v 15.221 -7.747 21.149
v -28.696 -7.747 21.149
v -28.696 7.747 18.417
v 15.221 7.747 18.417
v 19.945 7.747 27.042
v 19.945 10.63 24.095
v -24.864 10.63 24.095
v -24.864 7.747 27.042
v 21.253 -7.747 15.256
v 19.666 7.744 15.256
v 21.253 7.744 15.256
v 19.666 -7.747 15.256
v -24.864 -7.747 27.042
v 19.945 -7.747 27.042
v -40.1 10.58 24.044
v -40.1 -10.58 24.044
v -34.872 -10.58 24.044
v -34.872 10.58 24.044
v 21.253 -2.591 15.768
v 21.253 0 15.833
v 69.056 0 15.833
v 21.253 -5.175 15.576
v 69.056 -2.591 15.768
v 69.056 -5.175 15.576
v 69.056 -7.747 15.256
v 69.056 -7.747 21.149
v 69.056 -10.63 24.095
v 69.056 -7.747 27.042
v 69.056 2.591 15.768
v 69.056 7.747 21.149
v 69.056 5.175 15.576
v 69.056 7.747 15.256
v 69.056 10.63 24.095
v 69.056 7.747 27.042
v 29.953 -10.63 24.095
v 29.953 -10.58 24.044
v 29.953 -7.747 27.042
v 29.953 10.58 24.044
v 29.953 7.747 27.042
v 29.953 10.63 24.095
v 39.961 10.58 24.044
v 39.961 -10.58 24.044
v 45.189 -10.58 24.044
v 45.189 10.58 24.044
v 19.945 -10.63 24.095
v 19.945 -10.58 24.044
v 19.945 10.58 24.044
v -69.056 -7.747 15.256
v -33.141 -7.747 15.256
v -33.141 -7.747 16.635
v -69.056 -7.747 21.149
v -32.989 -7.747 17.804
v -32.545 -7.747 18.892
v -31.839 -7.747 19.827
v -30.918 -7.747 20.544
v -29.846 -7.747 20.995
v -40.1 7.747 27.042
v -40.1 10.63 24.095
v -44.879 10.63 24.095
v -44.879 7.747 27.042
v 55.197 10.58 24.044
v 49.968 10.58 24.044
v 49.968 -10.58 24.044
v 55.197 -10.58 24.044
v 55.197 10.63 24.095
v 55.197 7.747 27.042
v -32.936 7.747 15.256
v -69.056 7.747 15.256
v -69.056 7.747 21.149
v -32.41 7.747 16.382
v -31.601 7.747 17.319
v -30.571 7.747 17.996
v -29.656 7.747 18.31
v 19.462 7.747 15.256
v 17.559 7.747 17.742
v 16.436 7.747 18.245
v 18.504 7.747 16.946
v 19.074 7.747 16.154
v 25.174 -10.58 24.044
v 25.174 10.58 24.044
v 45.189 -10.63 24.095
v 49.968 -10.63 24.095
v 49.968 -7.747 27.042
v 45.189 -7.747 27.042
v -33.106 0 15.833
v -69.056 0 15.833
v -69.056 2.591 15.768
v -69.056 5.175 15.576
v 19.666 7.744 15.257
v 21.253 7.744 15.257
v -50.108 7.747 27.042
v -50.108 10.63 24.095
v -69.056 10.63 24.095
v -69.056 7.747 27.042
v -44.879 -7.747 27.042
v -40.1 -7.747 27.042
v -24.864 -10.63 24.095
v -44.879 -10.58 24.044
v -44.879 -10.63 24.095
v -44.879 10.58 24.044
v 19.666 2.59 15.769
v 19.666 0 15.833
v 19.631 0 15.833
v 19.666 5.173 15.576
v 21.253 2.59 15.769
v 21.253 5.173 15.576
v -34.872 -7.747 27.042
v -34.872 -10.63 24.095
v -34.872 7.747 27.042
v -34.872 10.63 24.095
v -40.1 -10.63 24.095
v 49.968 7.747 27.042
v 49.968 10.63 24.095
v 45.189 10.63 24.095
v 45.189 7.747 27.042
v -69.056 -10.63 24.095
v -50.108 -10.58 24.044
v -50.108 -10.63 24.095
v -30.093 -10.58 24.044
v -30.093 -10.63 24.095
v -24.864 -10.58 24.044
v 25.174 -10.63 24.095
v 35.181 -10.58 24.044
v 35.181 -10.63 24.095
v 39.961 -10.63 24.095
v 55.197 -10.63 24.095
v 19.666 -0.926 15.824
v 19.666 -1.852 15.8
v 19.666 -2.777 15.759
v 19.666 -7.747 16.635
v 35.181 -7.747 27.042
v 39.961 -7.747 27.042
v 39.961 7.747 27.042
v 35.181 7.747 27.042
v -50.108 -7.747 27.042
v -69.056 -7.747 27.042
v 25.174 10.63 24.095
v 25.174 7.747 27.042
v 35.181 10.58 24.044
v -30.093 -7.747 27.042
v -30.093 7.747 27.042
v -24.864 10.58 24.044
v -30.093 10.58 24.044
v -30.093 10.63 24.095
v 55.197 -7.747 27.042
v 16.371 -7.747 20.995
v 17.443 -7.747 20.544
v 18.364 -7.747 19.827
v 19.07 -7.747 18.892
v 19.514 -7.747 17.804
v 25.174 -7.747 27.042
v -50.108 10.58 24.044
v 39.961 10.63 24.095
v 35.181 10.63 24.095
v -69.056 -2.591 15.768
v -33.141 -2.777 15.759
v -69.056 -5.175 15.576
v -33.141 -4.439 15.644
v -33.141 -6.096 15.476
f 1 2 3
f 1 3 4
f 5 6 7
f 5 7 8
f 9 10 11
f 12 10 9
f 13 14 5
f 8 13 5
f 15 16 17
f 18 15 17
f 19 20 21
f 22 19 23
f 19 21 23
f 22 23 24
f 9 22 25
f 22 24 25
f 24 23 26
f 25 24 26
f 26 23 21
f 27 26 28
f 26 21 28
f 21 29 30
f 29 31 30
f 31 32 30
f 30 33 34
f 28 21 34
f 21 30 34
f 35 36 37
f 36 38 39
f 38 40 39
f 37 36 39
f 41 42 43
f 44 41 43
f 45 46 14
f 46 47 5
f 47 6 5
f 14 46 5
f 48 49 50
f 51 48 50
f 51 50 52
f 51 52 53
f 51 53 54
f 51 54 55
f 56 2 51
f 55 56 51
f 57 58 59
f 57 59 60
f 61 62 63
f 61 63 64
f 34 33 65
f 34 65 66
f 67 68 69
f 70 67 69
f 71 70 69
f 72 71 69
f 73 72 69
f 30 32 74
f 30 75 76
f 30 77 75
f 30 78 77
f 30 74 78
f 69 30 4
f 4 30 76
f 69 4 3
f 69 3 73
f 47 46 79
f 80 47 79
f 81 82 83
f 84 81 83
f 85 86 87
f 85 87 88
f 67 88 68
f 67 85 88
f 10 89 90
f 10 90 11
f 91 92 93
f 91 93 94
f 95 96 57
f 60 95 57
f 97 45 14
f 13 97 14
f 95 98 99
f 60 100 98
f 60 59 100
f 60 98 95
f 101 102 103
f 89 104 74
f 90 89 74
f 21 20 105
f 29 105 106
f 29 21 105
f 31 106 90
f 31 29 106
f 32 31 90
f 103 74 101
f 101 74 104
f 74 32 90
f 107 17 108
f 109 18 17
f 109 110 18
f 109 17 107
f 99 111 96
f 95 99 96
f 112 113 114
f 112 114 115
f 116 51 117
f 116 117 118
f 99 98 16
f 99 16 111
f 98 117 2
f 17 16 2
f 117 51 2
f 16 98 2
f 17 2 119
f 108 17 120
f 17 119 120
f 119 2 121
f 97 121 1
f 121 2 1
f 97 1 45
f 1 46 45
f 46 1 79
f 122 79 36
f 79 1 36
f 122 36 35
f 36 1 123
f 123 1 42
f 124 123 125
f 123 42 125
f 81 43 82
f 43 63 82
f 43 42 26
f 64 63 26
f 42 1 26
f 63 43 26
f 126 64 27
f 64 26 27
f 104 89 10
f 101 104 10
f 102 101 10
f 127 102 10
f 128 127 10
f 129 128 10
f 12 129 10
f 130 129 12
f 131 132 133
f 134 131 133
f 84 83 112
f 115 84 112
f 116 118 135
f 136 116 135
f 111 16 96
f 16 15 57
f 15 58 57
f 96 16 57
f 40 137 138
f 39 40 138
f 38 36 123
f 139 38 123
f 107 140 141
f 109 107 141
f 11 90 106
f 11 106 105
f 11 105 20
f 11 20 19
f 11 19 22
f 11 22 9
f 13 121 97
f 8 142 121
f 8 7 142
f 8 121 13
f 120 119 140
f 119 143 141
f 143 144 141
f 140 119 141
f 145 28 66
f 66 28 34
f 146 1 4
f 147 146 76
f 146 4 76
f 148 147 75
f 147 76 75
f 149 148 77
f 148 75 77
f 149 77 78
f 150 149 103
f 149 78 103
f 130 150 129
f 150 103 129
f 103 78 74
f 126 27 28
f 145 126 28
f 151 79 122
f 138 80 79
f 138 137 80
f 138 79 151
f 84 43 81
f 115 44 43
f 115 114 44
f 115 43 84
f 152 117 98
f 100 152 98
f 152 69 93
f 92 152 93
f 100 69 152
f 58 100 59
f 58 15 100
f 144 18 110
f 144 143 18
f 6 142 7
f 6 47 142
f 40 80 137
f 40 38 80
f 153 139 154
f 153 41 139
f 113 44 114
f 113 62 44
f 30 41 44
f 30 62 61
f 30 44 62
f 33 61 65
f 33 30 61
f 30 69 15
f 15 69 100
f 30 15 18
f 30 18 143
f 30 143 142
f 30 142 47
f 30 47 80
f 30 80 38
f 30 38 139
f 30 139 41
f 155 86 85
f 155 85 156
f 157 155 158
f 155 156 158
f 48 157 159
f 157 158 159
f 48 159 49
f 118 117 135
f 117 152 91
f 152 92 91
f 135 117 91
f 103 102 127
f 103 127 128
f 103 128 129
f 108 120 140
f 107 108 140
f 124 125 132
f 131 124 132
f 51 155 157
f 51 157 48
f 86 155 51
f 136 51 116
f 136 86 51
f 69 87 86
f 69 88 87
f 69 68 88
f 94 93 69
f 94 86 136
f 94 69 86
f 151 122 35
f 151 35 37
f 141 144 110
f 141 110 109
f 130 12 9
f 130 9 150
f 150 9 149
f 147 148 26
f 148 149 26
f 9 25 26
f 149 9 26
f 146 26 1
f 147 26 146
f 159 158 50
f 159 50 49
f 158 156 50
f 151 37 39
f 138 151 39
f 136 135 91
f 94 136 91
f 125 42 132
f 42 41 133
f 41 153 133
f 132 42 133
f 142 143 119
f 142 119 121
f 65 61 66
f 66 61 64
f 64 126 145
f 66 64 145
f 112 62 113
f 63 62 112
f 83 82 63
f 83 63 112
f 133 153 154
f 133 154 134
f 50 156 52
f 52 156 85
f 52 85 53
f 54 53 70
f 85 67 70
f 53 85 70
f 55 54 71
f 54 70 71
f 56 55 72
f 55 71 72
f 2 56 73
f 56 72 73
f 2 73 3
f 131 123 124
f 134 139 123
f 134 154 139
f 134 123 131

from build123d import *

# Parameters (mm, degrees)
F1_DEPTH  = 69.05625
F4_ANGLE  = 90
F5_W      = 5.2284544853
F5_H      = 7.121348225
F6_DEPTH  = 12.7
F7_W      = 52.8066
F7_H      = 18.3185085185
F7_H_2    = 5.8928
F9_DEPTH  = 25.4
F10_ANGLE = 350
F12_R     = 4.445
F14_DEPTH = 1.5875


# Not quite as in the source:
# - a feature names something its author has since deleted; it is built from what else it names


with BuildPart() as f1:
    # F0 (on Right) → F1 (new body, symmetric)
    with BuildSketch(Plane.YZ):
        with BuildLine():
            ThreePointArc((15.8326655208, 0), (15.688324924, -3.8842128409), (15.2560993298, -7.747))
            Line((15.2560993298, -7.747), (21.1488993298, -7.747))
            Line((21.1488993298, -7.747), (24.0952993298, -10.6299))
            Line((24.0952993298, -10.6299), (27.0416993298, -7.747))
            Line((27.0416993298, -7.747), (27.0416993298, 0))
            Line((27.0416993298, 0), (15.8326655208, 0))
        make_face()
    extrude(amount=F1_DEPTH, both=True)

    # F2: F1 across plane


with BuildPart() as f1_1:
    add(f1.part)
    add(f1.part.mirror(Plane.XY))


with BuildPart() as f1_2:
    # F4: moved
    add(f1_1.part.rotate(Axis((39.1787812114, 0, 0), (1, 0, 0)), F4_ANGLE))

    # F5 (on Front) → F6 (cut, symmetric)
    with BuildSketch(Plane.XZ):
        with Locations((-47.4936227574, 27.6051734423)):
            Rectangle(F5_W, F5_H)
        with Locations((-37.4860227574, 27.6051734423)):
            Rectangle(F5_W, F5_H)
        with Locations((-27.4784227574, 27.6051734423)):
            Rectangle(F5_W, F5_H)
        with Locations((22.5595772426, 27.6051734423)):
            Rectangle(F5_W, F5_H)
        with Locations((32.5671772426, 27.6051734423)):
            Rectangle(F5_W, F5_H)
        with Locations((42.5747772426, 27.6051734423)):
            Rectangle(F5_W, F5_H)
        with Locations((52.5823772426, 27.6051734423)):
            Rectangle(F5_W, F5_H)
    extrude(amount=F6_DEPTH, both=True, mode=Mode.SUBTRACT)


with BuildPart() as f9:
    # F7 (on face) → F9 (new body)
    with BuildSketch(Plane.XZ.offset(7.747)):
        with Locations((-6.73735, 6.0968450705)):
            Rectangle(F7_W, F7_H)
        with Locations((-6.73735, 18.2024993298)):
            Rectangle(F7_W, F7_H_2)
    extrude(amount=-F9_DEPTH)


with BuildPart() as f9_1:
    # F10: moved
    add(f9.part.rotate(Axis((-6.73735, -7.747, 21.1488993298), (1, 0, 0)), F10_ANGLE))


with BuildPart() as f1_3:
    add(f1_2.part)

    # F11: cut F9
    add(f9_1.part, mode=Mode.SUBTRACT)

    # F12
    f12_edges = [f1_3.edges().sort_by_distance(p)[0] for p in [
        (-33.14065, 0, 19.782894),
        (19.66595, 0, 19.782894),
    ]]
    fillet(f12_edges, radius=F12_R)

    # F13 (on face) → F14 (join)
    with BuildSketch(Plane(origin=(19.66595, 0, 0), x_dir=(0, -1, 0), z_dir=(-1, 0, 0))):
        Polygon((-7.7439094894, 15.2560993298), (7.747, 15.2560993298), (7.747, 16.6353280399), (-7.7439094894, 16.5785290301), align=None)
    extrude(amount=-F14_DEPTH)


solid = f1_3.part
